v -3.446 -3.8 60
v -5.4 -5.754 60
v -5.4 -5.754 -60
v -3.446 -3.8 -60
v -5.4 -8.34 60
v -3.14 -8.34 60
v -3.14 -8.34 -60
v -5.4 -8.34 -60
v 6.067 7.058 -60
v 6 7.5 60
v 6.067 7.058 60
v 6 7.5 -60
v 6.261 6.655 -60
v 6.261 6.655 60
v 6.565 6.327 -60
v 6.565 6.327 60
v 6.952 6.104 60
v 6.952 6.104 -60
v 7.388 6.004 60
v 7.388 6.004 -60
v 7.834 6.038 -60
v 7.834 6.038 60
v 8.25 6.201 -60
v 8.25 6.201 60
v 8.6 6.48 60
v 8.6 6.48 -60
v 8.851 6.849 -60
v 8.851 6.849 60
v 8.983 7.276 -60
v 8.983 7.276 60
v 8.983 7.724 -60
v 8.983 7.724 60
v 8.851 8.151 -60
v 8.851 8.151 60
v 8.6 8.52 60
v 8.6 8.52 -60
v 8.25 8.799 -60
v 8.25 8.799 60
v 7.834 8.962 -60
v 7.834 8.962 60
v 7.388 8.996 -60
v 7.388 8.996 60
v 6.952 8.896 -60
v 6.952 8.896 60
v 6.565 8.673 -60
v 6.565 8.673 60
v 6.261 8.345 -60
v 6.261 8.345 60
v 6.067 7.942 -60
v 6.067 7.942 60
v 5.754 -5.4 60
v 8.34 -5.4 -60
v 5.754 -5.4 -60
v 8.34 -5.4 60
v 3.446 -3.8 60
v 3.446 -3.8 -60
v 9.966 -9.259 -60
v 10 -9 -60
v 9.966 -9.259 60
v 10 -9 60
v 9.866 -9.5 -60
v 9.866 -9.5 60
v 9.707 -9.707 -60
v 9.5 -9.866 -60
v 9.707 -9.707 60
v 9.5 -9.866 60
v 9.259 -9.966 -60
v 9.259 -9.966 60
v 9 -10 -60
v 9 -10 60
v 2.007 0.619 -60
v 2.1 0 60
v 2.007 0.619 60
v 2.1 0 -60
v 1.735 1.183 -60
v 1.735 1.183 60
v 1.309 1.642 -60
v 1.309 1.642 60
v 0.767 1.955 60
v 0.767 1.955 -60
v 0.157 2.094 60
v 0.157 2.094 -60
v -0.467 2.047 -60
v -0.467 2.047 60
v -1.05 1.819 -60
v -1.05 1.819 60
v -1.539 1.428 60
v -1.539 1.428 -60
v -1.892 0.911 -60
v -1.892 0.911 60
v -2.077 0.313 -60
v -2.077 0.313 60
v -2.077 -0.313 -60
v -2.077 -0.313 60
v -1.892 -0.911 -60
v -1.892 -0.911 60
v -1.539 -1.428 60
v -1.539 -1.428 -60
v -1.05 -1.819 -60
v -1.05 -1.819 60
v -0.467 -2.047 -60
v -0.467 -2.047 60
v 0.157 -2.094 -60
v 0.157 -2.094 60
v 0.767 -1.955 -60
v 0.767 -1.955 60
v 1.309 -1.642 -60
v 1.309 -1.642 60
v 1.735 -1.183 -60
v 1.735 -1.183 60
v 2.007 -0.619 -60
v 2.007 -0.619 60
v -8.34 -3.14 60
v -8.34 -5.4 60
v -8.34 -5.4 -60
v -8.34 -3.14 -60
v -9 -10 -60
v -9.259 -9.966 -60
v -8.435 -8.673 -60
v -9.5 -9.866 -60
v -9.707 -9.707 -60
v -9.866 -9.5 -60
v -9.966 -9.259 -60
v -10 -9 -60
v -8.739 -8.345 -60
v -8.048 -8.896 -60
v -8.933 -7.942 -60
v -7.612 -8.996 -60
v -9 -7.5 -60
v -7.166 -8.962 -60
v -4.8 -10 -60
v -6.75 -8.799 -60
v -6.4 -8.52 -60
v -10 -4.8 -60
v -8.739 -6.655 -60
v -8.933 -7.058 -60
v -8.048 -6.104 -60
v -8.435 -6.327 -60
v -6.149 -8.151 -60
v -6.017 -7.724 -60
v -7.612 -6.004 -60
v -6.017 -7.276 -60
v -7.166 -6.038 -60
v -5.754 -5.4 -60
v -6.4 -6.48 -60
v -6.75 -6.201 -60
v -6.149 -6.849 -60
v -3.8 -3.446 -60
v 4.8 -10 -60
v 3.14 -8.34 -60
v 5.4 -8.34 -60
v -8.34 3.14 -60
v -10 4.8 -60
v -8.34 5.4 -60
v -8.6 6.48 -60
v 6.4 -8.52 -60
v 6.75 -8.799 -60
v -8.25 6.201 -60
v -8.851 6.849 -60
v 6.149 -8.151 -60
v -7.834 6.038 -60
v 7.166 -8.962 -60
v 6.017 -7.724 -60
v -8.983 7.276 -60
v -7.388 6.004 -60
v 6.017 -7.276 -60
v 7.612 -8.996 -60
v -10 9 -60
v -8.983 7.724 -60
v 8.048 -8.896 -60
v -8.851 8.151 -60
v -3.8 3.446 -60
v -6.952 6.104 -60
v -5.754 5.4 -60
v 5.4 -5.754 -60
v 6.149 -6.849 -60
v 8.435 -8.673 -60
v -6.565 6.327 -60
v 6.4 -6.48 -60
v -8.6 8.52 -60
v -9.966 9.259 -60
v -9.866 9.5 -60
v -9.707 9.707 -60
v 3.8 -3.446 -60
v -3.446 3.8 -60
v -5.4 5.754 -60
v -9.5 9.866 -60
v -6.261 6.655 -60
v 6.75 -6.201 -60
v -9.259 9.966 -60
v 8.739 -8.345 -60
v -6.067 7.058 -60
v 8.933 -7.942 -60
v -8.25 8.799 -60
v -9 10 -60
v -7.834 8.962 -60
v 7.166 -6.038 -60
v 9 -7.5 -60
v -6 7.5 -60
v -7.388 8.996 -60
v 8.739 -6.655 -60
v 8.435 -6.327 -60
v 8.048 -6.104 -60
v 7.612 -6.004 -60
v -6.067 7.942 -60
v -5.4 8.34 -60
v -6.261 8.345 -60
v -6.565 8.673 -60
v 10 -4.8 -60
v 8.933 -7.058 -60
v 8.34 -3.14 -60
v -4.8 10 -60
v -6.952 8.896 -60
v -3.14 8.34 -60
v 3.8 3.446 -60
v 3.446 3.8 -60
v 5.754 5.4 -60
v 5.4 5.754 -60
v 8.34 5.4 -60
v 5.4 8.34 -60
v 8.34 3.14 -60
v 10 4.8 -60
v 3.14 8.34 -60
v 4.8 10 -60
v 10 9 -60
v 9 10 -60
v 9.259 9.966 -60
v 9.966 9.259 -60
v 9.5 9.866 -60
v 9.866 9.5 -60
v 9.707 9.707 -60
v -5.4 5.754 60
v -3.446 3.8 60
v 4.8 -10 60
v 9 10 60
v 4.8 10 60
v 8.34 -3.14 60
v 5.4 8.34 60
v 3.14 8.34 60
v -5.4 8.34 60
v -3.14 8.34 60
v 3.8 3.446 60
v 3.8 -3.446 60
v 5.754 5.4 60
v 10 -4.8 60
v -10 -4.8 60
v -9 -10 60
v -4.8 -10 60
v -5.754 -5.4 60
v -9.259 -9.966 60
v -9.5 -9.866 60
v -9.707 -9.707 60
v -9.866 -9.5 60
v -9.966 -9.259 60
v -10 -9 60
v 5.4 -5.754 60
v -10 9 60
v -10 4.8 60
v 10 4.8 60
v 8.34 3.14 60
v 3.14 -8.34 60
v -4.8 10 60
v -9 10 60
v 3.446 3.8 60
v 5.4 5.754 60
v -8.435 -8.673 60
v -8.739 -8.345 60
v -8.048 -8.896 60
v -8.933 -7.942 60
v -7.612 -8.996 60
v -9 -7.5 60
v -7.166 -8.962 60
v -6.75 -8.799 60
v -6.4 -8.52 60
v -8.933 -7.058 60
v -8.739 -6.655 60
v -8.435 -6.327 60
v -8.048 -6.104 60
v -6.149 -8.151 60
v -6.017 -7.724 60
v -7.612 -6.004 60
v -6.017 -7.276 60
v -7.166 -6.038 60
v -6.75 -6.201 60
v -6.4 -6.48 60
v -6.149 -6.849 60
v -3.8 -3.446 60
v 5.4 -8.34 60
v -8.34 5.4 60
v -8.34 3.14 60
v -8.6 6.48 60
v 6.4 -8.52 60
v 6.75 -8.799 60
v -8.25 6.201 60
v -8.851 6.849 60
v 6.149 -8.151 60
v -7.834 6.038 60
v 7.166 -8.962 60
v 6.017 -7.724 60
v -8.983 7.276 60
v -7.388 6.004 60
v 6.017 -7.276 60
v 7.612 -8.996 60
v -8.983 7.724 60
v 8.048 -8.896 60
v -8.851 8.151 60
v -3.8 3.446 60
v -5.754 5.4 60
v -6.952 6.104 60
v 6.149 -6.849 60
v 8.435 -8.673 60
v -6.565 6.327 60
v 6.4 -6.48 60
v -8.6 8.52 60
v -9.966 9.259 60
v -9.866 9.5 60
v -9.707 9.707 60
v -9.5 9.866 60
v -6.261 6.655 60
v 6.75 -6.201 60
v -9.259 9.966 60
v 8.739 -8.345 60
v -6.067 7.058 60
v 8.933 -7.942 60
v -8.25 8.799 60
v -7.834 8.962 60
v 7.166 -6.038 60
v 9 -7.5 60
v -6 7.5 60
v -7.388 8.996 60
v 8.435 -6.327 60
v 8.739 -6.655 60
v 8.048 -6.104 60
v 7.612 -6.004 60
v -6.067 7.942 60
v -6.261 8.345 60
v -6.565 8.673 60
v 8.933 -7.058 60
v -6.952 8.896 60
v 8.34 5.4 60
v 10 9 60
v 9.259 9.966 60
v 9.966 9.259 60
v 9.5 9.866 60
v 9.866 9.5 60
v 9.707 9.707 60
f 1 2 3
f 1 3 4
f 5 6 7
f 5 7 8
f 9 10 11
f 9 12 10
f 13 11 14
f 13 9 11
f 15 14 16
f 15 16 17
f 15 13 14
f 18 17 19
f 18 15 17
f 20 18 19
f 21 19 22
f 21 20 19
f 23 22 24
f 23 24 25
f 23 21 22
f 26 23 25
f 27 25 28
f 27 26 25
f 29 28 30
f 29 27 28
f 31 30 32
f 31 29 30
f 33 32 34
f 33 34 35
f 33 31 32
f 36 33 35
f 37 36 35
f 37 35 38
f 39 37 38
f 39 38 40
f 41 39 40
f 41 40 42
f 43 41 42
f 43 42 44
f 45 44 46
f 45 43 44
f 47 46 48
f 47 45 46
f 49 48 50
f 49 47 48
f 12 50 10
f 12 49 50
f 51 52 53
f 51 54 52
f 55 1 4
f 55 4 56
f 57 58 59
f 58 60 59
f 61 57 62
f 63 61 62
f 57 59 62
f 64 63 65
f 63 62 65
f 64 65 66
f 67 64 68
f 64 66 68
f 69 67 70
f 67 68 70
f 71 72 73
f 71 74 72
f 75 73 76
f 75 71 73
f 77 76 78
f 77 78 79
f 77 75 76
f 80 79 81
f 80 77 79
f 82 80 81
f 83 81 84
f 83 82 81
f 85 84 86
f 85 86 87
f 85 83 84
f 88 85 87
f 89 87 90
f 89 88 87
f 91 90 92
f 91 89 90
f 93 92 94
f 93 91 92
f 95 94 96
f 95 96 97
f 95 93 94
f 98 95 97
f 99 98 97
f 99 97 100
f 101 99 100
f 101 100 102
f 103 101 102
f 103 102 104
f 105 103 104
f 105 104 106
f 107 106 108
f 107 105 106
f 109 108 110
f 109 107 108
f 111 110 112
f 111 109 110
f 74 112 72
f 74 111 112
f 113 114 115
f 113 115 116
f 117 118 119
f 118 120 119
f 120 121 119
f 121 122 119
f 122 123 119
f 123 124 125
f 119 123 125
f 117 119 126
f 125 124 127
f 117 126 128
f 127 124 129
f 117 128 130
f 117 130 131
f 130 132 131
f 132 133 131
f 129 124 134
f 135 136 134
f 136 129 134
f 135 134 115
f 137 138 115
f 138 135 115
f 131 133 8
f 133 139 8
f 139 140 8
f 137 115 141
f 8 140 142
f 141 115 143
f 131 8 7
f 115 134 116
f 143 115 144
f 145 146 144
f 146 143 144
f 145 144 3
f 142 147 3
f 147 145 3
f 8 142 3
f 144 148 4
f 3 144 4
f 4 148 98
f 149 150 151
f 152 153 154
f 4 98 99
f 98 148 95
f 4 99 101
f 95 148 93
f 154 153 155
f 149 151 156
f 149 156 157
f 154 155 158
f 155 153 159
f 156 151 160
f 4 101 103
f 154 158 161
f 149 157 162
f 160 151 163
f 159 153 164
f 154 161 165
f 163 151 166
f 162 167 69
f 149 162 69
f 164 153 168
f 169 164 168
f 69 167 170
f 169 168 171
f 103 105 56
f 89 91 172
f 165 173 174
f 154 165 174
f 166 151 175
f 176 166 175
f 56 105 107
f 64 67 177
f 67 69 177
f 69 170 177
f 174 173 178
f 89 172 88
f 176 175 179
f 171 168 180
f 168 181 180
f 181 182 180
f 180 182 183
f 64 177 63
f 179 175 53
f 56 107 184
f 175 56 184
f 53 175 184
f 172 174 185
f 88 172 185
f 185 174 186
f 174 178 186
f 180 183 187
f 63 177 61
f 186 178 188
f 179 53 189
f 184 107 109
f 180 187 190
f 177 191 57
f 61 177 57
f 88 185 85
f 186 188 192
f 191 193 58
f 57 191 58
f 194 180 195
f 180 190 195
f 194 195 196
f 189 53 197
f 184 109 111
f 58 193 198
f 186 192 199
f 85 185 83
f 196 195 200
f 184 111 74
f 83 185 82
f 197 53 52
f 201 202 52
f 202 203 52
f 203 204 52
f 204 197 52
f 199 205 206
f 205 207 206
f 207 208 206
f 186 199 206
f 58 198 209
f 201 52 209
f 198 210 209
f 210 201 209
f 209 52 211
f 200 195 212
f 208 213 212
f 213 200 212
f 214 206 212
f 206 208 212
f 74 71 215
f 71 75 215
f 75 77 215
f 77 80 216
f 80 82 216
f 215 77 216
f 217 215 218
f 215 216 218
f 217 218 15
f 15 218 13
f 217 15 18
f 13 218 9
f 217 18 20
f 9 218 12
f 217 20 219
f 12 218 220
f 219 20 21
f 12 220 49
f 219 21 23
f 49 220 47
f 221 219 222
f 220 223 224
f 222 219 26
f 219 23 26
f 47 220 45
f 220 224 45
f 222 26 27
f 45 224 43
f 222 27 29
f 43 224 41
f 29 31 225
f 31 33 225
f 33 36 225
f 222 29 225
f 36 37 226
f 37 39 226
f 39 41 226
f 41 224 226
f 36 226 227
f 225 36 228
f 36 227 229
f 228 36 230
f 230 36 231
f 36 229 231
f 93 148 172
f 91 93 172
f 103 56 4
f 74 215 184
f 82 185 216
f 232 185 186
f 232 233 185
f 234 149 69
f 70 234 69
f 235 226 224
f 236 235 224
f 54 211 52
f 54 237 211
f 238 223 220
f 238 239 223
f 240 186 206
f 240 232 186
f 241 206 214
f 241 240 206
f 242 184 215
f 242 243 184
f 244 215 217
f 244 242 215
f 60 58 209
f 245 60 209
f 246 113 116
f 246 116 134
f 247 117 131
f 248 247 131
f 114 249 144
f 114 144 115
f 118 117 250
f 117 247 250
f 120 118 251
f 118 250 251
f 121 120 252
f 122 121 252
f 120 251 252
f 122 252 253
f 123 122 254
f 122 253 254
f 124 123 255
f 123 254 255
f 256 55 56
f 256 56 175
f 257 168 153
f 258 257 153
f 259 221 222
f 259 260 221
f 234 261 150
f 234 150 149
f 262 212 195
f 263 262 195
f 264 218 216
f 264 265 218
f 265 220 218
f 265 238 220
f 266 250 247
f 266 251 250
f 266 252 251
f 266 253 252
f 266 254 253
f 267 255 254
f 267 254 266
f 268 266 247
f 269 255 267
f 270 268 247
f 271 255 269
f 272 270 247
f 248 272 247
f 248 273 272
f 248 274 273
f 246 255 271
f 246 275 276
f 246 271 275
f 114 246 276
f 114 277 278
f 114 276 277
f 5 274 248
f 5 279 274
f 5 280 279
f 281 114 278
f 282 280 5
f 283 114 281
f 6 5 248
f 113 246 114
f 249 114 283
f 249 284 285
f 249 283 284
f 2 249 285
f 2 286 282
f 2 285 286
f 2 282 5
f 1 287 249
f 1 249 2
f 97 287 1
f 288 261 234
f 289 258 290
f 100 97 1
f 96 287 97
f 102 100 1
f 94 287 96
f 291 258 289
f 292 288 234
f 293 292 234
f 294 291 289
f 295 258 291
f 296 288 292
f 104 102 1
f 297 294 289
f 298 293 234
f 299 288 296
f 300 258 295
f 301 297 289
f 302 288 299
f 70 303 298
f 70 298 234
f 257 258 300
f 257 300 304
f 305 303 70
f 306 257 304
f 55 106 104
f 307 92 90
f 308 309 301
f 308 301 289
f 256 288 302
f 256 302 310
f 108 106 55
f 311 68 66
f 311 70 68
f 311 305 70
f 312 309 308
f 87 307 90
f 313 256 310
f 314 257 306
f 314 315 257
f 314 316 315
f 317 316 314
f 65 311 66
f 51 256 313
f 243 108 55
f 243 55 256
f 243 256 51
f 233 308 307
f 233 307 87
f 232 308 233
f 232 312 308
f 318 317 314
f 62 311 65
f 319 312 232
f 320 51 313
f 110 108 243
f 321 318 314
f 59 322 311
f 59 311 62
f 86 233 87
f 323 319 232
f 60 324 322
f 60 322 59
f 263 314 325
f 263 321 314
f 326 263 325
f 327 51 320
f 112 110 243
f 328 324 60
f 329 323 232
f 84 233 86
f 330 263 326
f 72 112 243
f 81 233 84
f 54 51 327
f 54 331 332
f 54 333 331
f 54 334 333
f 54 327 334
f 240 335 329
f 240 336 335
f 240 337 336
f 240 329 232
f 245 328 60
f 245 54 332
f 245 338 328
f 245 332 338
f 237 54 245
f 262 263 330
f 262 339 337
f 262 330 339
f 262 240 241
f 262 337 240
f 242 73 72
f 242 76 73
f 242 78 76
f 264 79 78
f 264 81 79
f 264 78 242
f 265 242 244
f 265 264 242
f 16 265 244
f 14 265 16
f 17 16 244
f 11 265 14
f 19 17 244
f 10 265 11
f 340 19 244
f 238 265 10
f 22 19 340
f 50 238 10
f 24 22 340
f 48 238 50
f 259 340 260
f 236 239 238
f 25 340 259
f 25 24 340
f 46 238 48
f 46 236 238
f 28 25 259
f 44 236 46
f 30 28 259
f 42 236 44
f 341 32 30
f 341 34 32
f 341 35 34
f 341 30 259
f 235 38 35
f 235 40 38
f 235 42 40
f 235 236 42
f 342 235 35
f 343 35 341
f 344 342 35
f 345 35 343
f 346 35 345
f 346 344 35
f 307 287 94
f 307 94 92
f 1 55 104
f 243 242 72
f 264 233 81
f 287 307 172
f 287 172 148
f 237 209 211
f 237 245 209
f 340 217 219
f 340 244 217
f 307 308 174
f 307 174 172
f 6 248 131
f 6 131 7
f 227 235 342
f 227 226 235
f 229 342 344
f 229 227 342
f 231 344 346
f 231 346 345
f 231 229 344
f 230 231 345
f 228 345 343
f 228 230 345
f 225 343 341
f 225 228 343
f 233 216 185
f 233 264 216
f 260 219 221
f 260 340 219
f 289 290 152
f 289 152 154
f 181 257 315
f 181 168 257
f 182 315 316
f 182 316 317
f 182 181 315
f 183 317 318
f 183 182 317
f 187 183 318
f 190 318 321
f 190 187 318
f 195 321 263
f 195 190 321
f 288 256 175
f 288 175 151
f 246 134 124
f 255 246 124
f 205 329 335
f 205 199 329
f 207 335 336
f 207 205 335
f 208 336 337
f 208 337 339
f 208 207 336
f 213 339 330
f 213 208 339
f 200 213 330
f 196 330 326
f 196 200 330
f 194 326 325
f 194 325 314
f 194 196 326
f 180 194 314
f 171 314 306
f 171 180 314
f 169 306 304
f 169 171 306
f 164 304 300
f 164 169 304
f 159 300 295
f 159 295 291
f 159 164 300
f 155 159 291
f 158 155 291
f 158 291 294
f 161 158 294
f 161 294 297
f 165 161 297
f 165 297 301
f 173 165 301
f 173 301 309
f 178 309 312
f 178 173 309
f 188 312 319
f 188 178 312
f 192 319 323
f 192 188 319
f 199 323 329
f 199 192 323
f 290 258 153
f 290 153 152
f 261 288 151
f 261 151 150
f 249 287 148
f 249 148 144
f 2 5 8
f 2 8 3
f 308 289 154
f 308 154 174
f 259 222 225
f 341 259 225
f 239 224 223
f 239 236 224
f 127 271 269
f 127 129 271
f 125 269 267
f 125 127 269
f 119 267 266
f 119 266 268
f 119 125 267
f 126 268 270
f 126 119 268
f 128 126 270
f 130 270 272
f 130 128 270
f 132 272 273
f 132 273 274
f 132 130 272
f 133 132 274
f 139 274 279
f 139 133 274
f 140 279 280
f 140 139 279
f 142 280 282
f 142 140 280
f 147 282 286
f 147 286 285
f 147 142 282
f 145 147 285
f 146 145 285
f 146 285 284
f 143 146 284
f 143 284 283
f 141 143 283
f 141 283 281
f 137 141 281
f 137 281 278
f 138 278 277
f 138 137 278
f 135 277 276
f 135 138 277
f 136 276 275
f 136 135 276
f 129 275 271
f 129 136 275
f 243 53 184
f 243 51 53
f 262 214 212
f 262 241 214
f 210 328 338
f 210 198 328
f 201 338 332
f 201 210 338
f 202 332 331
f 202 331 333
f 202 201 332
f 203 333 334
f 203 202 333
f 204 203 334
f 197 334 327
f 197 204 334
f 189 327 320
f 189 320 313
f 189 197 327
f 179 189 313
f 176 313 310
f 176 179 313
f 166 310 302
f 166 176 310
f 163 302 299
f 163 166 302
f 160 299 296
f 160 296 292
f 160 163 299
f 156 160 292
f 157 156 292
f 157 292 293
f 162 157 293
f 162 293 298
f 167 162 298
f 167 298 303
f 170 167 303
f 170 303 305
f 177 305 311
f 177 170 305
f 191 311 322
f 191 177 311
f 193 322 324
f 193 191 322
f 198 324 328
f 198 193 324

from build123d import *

# Parameters (mm, degrees)
SKETCH_1_R      = 1.5
SKETCH_1_R_2    = 2.1
EXTRUDE_1_DEPTH = 60
FILLET_1_R      = 1


with BuildPart() as part:
    # 草图1 → 凸台-拉伸1 (new, symmetric)
    with BuildSketch(Plane.XY):
        Polygon((-10, 10), (-10, 4.8), (-8.34, 3.14), (-8.34, 5.4), (-5.753553391, 5.4), (-3.8, 3.446446609), (-3.8, -3.446446609), (-5.753553391, -5.4), (-8.34, -5.4), (-8.34, -3.14), (-10, -4.8), (-10, -10), (-4.8, -10), (-3.14, -8.34), (-5.4, -8.34), (-5.4, -5.753553391), (-3.446446609, -3.8), (3.446446609, -3.8), (5.4, -5.753553391), (5.4, -8.34), (3.14, -8.34), (4.8, -10), (10, -10), (10, -4.8), (8.34, -3.14), (8.34, -5.4), (5.753553391, -5.4), (3.8, -3.446446609), (3.8, 3.446446609), (5.753553391, 5.4), (8.34, 5.4), (8.34, 3.14), (10, 4.8), (10, 10), (4.8, 10), (3.14, 8.34), (5.4, 8.34), (5.4, 5.753553391), (3.446446609, 3.8), (-3.446446609, 3.8), (-5.4, 5.753553391), (-5.4, 8.34), (-3.14, 8.34), (-4.8, 10), align=None)
        with Locations((-7.5, 7.5)):
            Circle(SKETCH_1_R, mode=Mode.SUBTRACT)
        Circle(SKETCH_1_R_2, mode=Mode.SUBTRACT)
        with Locations(Location((-7.5, -7.5, 0), (0, 0, 180))):
            Circle(SKETCH_1_R, mode=Mode.SUBTRACT)
        with Locations((7.5, -7.5)):
            Circle(SKETCH_1_R, mode=Mode.SUBTRACT)
        with Locations(Location((7.5, 7.5, 0), (0, 0, 180))):
            Circle(SKETCH_1_R, mode=Mode.SUBTRACT)
    extrude(amount=EXTRUDE_1_DEPTH, both=True)

    # 圆角1
    fillet_1_edges = [part.edges().sort_by_distance(p)[0] for p in [
        (10, 10, 0),
        (10, -10, 0),
        (-10, -10, 0),
        (-10, 10, 0),
    ]]
    fillet(fillet_1_edges, radius=FILLET_1_R)


solid = part.part
